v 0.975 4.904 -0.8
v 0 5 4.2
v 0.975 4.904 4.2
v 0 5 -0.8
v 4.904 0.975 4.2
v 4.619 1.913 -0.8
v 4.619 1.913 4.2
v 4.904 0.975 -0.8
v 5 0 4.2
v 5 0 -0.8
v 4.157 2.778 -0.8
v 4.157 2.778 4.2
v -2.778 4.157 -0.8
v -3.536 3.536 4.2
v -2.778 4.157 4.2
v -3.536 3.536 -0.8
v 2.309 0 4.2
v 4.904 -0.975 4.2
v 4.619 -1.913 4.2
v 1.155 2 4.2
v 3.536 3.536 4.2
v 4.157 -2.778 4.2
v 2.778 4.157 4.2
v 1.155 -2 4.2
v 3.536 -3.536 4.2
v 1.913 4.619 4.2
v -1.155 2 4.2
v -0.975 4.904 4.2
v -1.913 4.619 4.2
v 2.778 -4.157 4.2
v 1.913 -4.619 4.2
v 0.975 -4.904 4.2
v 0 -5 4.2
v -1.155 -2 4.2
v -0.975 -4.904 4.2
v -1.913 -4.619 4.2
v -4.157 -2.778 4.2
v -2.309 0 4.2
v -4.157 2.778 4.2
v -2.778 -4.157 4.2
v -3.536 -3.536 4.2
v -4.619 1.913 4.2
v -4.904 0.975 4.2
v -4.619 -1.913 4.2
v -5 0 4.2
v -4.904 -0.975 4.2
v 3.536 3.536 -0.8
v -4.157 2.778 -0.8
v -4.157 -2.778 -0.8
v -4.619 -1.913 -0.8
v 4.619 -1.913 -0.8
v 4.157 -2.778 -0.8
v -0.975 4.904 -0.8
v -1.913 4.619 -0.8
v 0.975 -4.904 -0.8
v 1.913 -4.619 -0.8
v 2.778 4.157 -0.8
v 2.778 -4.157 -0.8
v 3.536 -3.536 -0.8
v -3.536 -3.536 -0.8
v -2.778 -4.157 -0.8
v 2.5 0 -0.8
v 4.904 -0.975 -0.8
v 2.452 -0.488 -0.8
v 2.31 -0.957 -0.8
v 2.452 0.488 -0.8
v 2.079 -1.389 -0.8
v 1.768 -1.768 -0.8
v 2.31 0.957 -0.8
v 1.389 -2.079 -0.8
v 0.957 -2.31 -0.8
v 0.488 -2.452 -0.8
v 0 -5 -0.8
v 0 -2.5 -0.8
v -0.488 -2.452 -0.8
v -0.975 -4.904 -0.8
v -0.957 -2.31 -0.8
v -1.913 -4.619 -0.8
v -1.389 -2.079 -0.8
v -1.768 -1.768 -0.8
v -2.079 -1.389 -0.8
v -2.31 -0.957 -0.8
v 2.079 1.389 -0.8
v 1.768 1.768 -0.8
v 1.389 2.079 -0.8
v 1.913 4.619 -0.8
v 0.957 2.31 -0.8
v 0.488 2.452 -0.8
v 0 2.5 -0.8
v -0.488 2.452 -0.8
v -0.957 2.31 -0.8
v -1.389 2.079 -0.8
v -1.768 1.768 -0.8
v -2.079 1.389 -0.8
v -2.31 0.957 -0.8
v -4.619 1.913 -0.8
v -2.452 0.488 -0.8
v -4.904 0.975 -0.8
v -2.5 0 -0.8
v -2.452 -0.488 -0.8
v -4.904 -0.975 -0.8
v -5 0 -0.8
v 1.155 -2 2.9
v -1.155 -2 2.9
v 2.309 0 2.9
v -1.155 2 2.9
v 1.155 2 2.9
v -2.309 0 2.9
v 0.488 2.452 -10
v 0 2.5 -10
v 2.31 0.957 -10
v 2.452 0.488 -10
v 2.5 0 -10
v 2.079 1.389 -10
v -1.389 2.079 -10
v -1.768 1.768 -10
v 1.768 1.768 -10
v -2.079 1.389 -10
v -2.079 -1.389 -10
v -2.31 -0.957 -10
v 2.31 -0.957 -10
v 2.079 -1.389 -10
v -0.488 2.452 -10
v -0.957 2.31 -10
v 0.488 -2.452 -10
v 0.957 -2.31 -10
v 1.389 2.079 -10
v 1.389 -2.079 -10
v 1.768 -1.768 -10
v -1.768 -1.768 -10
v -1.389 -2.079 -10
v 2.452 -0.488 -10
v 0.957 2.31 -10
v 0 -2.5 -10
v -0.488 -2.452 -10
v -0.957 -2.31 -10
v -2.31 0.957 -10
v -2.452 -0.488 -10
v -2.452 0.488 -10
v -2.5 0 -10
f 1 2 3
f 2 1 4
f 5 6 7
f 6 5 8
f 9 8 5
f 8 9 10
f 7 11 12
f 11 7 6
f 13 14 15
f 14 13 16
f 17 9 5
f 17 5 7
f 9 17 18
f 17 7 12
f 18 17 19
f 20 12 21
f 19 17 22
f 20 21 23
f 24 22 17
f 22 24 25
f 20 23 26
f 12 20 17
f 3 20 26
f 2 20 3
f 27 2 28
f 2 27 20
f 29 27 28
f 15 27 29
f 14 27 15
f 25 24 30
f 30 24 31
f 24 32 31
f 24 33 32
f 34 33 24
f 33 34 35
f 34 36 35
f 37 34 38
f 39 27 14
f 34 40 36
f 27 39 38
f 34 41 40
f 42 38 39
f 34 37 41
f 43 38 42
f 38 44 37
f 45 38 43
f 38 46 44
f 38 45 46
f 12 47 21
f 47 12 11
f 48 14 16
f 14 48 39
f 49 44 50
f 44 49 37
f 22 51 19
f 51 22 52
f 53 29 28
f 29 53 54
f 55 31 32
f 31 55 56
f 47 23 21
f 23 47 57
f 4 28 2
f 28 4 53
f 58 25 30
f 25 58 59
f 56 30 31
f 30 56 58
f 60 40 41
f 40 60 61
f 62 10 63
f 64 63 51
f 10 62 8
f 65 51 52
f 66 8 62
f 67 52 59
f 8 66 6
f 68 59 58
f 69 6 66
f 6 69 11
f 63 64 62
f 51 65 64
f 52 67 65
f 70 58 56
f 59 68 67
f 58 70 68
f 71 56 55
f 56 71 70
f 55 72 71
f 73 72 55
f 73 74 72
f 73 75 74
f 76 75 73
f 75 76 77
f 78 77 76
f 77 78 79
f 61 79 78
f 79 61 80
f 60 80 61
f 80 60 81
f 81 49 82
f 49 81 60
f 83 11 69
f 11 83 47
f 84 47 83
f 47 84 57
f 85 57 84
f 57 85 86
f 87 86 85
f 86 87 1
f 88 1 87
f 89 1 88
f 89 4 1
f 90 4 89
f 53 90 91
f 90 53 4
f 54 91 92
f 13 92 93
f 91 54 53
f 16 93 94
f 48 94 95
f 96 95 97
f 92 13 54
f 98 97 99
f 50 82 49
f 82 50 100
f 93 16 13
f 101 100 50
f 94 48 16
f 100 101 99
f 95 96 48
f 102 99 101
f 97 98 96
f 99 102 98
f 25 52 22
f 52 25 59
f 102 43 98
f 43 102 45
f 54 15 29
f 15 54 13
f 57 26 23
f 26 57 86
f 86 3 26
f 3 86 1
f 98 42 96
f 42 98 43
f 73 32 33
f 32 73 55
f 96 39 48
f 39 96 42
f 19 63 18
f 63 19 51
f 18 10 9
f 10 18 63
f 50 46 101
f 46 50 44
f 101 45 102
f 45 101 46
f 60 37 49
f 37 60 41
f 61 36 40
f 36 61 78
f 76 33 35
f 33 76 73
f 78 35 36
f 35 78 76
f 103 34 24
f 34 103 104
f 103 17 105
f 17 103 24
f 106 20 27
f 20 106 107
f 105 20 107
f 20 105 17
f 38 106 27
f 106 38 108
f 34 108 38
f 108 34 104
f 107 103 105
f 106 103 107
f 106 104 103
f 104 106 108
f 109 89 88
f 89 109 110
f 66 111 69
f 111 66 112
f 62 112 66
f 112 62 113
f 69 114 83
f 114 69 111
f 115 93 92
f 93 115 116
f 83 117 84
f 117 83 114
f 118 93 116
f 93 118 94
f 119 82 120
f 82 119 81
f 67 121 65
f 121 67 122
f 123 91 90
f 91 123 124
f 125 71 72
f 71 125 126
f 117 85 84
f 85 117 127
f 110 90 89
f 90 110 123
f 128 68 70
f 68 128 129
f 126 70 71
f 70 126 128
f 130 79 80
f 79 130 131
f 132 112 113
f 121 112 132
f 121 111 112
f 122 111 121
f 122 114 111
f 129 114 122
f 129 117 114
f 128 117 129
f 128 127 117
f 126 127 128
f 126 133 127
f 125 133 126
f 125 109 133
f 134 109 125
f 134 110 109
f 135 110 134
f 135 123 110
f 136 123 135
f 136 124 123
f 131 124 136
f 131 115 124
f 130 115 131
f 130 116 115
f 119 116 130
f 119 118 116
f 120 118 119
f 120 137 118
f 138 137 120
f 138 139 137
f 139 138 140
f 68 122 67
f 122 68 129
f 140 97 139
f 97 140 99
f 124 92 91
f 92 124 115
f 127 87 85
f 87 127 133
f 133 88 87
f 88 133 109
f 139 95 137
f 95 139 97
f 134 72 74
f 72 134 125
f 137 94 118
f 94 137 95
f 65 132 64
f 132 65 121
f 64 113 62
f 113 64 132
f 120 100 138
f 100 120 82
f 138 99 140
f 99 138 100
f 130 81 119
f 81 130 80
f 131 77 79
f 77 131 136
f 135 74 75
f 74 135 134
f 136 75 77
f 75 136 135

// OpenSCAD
// Parameters
thread_diameter_mm = 5.0; //[2.5:10.0:0.1]
length_mm = 10.0; //[5.0:20.0:0.5]
head_diameter_mm = 10.0; //[5.0:20.0:0.5]
head_height_mm = 5.0; //[2.5:10.0:0.5]
hex_socket_af_mm = 4.0; //[2.0:8.0:0.1]
hex_socket_depth_mm = 3.0; //[1.5:6.0:0.1]
washer_enabled = 1; //[0:1:1]
washer_outer_diameter_mm = 10.0; //[5.0:20.0:0.5]
washer_thickness_mm = 1.0; //[0.5:3.0:0.1]
fit_clearance_mm = 0.3; //[0.0:0.8:0.05]
overlap_mm = 0.8; //[0.5:2.0:0.1]

// M5 Socket Head Cap Screw
module screw() {
  color("DimGray") {
    // Screw Shaft
    translate([0, 0, -length_mm/2])
      cylinder(r=thread_diameter_mm/2, h=length_mm, center=true, $fn=32);
    
    // Socket Head
    translate([0, 0, head_height_mm/2 - overlap_mm])
      difference() {
        cylinder(r=head_diameter_mm/2, h=head_height_mm, center=true, $fn=32);
        translate([0, 0, head_height_mm - hex_socket_depth_mm/2])
          cylinder(r=hex_socket_af_mm/(2*cos(30)), h=hex_socket_depth_mm + overlap_mm*2, center=true, $fn=6);
      }
  }
}

// Washer
module washer() {
  color("Silver") {
    difference() {
      translate([0, 0, -washer_thickness_mm/2 + overlap_mm])
        cylinder(r=washer_outer_diameter_mm/2, h=washer_thickness_mm, center=true, $fn=32);
      translate([0, 0, -washer_thickness_mm/2 + overlap_mm])
        cylinder(r=thread_diameter_mm/2 + fit_clearance_mm, h=washer_thickness_mm + overlap_mm*4, center=true, $fn=32);
    }
  }
}

// Screw and Washer Assembly
module screw_and_washer() {
  union() {
    screw();
    scale([washer_enabled, washer_enabled, washer_enabled]) washer();
  }
}

// Final Assembly
module assembly() {
  screw_and_washer();
}

assembly();
